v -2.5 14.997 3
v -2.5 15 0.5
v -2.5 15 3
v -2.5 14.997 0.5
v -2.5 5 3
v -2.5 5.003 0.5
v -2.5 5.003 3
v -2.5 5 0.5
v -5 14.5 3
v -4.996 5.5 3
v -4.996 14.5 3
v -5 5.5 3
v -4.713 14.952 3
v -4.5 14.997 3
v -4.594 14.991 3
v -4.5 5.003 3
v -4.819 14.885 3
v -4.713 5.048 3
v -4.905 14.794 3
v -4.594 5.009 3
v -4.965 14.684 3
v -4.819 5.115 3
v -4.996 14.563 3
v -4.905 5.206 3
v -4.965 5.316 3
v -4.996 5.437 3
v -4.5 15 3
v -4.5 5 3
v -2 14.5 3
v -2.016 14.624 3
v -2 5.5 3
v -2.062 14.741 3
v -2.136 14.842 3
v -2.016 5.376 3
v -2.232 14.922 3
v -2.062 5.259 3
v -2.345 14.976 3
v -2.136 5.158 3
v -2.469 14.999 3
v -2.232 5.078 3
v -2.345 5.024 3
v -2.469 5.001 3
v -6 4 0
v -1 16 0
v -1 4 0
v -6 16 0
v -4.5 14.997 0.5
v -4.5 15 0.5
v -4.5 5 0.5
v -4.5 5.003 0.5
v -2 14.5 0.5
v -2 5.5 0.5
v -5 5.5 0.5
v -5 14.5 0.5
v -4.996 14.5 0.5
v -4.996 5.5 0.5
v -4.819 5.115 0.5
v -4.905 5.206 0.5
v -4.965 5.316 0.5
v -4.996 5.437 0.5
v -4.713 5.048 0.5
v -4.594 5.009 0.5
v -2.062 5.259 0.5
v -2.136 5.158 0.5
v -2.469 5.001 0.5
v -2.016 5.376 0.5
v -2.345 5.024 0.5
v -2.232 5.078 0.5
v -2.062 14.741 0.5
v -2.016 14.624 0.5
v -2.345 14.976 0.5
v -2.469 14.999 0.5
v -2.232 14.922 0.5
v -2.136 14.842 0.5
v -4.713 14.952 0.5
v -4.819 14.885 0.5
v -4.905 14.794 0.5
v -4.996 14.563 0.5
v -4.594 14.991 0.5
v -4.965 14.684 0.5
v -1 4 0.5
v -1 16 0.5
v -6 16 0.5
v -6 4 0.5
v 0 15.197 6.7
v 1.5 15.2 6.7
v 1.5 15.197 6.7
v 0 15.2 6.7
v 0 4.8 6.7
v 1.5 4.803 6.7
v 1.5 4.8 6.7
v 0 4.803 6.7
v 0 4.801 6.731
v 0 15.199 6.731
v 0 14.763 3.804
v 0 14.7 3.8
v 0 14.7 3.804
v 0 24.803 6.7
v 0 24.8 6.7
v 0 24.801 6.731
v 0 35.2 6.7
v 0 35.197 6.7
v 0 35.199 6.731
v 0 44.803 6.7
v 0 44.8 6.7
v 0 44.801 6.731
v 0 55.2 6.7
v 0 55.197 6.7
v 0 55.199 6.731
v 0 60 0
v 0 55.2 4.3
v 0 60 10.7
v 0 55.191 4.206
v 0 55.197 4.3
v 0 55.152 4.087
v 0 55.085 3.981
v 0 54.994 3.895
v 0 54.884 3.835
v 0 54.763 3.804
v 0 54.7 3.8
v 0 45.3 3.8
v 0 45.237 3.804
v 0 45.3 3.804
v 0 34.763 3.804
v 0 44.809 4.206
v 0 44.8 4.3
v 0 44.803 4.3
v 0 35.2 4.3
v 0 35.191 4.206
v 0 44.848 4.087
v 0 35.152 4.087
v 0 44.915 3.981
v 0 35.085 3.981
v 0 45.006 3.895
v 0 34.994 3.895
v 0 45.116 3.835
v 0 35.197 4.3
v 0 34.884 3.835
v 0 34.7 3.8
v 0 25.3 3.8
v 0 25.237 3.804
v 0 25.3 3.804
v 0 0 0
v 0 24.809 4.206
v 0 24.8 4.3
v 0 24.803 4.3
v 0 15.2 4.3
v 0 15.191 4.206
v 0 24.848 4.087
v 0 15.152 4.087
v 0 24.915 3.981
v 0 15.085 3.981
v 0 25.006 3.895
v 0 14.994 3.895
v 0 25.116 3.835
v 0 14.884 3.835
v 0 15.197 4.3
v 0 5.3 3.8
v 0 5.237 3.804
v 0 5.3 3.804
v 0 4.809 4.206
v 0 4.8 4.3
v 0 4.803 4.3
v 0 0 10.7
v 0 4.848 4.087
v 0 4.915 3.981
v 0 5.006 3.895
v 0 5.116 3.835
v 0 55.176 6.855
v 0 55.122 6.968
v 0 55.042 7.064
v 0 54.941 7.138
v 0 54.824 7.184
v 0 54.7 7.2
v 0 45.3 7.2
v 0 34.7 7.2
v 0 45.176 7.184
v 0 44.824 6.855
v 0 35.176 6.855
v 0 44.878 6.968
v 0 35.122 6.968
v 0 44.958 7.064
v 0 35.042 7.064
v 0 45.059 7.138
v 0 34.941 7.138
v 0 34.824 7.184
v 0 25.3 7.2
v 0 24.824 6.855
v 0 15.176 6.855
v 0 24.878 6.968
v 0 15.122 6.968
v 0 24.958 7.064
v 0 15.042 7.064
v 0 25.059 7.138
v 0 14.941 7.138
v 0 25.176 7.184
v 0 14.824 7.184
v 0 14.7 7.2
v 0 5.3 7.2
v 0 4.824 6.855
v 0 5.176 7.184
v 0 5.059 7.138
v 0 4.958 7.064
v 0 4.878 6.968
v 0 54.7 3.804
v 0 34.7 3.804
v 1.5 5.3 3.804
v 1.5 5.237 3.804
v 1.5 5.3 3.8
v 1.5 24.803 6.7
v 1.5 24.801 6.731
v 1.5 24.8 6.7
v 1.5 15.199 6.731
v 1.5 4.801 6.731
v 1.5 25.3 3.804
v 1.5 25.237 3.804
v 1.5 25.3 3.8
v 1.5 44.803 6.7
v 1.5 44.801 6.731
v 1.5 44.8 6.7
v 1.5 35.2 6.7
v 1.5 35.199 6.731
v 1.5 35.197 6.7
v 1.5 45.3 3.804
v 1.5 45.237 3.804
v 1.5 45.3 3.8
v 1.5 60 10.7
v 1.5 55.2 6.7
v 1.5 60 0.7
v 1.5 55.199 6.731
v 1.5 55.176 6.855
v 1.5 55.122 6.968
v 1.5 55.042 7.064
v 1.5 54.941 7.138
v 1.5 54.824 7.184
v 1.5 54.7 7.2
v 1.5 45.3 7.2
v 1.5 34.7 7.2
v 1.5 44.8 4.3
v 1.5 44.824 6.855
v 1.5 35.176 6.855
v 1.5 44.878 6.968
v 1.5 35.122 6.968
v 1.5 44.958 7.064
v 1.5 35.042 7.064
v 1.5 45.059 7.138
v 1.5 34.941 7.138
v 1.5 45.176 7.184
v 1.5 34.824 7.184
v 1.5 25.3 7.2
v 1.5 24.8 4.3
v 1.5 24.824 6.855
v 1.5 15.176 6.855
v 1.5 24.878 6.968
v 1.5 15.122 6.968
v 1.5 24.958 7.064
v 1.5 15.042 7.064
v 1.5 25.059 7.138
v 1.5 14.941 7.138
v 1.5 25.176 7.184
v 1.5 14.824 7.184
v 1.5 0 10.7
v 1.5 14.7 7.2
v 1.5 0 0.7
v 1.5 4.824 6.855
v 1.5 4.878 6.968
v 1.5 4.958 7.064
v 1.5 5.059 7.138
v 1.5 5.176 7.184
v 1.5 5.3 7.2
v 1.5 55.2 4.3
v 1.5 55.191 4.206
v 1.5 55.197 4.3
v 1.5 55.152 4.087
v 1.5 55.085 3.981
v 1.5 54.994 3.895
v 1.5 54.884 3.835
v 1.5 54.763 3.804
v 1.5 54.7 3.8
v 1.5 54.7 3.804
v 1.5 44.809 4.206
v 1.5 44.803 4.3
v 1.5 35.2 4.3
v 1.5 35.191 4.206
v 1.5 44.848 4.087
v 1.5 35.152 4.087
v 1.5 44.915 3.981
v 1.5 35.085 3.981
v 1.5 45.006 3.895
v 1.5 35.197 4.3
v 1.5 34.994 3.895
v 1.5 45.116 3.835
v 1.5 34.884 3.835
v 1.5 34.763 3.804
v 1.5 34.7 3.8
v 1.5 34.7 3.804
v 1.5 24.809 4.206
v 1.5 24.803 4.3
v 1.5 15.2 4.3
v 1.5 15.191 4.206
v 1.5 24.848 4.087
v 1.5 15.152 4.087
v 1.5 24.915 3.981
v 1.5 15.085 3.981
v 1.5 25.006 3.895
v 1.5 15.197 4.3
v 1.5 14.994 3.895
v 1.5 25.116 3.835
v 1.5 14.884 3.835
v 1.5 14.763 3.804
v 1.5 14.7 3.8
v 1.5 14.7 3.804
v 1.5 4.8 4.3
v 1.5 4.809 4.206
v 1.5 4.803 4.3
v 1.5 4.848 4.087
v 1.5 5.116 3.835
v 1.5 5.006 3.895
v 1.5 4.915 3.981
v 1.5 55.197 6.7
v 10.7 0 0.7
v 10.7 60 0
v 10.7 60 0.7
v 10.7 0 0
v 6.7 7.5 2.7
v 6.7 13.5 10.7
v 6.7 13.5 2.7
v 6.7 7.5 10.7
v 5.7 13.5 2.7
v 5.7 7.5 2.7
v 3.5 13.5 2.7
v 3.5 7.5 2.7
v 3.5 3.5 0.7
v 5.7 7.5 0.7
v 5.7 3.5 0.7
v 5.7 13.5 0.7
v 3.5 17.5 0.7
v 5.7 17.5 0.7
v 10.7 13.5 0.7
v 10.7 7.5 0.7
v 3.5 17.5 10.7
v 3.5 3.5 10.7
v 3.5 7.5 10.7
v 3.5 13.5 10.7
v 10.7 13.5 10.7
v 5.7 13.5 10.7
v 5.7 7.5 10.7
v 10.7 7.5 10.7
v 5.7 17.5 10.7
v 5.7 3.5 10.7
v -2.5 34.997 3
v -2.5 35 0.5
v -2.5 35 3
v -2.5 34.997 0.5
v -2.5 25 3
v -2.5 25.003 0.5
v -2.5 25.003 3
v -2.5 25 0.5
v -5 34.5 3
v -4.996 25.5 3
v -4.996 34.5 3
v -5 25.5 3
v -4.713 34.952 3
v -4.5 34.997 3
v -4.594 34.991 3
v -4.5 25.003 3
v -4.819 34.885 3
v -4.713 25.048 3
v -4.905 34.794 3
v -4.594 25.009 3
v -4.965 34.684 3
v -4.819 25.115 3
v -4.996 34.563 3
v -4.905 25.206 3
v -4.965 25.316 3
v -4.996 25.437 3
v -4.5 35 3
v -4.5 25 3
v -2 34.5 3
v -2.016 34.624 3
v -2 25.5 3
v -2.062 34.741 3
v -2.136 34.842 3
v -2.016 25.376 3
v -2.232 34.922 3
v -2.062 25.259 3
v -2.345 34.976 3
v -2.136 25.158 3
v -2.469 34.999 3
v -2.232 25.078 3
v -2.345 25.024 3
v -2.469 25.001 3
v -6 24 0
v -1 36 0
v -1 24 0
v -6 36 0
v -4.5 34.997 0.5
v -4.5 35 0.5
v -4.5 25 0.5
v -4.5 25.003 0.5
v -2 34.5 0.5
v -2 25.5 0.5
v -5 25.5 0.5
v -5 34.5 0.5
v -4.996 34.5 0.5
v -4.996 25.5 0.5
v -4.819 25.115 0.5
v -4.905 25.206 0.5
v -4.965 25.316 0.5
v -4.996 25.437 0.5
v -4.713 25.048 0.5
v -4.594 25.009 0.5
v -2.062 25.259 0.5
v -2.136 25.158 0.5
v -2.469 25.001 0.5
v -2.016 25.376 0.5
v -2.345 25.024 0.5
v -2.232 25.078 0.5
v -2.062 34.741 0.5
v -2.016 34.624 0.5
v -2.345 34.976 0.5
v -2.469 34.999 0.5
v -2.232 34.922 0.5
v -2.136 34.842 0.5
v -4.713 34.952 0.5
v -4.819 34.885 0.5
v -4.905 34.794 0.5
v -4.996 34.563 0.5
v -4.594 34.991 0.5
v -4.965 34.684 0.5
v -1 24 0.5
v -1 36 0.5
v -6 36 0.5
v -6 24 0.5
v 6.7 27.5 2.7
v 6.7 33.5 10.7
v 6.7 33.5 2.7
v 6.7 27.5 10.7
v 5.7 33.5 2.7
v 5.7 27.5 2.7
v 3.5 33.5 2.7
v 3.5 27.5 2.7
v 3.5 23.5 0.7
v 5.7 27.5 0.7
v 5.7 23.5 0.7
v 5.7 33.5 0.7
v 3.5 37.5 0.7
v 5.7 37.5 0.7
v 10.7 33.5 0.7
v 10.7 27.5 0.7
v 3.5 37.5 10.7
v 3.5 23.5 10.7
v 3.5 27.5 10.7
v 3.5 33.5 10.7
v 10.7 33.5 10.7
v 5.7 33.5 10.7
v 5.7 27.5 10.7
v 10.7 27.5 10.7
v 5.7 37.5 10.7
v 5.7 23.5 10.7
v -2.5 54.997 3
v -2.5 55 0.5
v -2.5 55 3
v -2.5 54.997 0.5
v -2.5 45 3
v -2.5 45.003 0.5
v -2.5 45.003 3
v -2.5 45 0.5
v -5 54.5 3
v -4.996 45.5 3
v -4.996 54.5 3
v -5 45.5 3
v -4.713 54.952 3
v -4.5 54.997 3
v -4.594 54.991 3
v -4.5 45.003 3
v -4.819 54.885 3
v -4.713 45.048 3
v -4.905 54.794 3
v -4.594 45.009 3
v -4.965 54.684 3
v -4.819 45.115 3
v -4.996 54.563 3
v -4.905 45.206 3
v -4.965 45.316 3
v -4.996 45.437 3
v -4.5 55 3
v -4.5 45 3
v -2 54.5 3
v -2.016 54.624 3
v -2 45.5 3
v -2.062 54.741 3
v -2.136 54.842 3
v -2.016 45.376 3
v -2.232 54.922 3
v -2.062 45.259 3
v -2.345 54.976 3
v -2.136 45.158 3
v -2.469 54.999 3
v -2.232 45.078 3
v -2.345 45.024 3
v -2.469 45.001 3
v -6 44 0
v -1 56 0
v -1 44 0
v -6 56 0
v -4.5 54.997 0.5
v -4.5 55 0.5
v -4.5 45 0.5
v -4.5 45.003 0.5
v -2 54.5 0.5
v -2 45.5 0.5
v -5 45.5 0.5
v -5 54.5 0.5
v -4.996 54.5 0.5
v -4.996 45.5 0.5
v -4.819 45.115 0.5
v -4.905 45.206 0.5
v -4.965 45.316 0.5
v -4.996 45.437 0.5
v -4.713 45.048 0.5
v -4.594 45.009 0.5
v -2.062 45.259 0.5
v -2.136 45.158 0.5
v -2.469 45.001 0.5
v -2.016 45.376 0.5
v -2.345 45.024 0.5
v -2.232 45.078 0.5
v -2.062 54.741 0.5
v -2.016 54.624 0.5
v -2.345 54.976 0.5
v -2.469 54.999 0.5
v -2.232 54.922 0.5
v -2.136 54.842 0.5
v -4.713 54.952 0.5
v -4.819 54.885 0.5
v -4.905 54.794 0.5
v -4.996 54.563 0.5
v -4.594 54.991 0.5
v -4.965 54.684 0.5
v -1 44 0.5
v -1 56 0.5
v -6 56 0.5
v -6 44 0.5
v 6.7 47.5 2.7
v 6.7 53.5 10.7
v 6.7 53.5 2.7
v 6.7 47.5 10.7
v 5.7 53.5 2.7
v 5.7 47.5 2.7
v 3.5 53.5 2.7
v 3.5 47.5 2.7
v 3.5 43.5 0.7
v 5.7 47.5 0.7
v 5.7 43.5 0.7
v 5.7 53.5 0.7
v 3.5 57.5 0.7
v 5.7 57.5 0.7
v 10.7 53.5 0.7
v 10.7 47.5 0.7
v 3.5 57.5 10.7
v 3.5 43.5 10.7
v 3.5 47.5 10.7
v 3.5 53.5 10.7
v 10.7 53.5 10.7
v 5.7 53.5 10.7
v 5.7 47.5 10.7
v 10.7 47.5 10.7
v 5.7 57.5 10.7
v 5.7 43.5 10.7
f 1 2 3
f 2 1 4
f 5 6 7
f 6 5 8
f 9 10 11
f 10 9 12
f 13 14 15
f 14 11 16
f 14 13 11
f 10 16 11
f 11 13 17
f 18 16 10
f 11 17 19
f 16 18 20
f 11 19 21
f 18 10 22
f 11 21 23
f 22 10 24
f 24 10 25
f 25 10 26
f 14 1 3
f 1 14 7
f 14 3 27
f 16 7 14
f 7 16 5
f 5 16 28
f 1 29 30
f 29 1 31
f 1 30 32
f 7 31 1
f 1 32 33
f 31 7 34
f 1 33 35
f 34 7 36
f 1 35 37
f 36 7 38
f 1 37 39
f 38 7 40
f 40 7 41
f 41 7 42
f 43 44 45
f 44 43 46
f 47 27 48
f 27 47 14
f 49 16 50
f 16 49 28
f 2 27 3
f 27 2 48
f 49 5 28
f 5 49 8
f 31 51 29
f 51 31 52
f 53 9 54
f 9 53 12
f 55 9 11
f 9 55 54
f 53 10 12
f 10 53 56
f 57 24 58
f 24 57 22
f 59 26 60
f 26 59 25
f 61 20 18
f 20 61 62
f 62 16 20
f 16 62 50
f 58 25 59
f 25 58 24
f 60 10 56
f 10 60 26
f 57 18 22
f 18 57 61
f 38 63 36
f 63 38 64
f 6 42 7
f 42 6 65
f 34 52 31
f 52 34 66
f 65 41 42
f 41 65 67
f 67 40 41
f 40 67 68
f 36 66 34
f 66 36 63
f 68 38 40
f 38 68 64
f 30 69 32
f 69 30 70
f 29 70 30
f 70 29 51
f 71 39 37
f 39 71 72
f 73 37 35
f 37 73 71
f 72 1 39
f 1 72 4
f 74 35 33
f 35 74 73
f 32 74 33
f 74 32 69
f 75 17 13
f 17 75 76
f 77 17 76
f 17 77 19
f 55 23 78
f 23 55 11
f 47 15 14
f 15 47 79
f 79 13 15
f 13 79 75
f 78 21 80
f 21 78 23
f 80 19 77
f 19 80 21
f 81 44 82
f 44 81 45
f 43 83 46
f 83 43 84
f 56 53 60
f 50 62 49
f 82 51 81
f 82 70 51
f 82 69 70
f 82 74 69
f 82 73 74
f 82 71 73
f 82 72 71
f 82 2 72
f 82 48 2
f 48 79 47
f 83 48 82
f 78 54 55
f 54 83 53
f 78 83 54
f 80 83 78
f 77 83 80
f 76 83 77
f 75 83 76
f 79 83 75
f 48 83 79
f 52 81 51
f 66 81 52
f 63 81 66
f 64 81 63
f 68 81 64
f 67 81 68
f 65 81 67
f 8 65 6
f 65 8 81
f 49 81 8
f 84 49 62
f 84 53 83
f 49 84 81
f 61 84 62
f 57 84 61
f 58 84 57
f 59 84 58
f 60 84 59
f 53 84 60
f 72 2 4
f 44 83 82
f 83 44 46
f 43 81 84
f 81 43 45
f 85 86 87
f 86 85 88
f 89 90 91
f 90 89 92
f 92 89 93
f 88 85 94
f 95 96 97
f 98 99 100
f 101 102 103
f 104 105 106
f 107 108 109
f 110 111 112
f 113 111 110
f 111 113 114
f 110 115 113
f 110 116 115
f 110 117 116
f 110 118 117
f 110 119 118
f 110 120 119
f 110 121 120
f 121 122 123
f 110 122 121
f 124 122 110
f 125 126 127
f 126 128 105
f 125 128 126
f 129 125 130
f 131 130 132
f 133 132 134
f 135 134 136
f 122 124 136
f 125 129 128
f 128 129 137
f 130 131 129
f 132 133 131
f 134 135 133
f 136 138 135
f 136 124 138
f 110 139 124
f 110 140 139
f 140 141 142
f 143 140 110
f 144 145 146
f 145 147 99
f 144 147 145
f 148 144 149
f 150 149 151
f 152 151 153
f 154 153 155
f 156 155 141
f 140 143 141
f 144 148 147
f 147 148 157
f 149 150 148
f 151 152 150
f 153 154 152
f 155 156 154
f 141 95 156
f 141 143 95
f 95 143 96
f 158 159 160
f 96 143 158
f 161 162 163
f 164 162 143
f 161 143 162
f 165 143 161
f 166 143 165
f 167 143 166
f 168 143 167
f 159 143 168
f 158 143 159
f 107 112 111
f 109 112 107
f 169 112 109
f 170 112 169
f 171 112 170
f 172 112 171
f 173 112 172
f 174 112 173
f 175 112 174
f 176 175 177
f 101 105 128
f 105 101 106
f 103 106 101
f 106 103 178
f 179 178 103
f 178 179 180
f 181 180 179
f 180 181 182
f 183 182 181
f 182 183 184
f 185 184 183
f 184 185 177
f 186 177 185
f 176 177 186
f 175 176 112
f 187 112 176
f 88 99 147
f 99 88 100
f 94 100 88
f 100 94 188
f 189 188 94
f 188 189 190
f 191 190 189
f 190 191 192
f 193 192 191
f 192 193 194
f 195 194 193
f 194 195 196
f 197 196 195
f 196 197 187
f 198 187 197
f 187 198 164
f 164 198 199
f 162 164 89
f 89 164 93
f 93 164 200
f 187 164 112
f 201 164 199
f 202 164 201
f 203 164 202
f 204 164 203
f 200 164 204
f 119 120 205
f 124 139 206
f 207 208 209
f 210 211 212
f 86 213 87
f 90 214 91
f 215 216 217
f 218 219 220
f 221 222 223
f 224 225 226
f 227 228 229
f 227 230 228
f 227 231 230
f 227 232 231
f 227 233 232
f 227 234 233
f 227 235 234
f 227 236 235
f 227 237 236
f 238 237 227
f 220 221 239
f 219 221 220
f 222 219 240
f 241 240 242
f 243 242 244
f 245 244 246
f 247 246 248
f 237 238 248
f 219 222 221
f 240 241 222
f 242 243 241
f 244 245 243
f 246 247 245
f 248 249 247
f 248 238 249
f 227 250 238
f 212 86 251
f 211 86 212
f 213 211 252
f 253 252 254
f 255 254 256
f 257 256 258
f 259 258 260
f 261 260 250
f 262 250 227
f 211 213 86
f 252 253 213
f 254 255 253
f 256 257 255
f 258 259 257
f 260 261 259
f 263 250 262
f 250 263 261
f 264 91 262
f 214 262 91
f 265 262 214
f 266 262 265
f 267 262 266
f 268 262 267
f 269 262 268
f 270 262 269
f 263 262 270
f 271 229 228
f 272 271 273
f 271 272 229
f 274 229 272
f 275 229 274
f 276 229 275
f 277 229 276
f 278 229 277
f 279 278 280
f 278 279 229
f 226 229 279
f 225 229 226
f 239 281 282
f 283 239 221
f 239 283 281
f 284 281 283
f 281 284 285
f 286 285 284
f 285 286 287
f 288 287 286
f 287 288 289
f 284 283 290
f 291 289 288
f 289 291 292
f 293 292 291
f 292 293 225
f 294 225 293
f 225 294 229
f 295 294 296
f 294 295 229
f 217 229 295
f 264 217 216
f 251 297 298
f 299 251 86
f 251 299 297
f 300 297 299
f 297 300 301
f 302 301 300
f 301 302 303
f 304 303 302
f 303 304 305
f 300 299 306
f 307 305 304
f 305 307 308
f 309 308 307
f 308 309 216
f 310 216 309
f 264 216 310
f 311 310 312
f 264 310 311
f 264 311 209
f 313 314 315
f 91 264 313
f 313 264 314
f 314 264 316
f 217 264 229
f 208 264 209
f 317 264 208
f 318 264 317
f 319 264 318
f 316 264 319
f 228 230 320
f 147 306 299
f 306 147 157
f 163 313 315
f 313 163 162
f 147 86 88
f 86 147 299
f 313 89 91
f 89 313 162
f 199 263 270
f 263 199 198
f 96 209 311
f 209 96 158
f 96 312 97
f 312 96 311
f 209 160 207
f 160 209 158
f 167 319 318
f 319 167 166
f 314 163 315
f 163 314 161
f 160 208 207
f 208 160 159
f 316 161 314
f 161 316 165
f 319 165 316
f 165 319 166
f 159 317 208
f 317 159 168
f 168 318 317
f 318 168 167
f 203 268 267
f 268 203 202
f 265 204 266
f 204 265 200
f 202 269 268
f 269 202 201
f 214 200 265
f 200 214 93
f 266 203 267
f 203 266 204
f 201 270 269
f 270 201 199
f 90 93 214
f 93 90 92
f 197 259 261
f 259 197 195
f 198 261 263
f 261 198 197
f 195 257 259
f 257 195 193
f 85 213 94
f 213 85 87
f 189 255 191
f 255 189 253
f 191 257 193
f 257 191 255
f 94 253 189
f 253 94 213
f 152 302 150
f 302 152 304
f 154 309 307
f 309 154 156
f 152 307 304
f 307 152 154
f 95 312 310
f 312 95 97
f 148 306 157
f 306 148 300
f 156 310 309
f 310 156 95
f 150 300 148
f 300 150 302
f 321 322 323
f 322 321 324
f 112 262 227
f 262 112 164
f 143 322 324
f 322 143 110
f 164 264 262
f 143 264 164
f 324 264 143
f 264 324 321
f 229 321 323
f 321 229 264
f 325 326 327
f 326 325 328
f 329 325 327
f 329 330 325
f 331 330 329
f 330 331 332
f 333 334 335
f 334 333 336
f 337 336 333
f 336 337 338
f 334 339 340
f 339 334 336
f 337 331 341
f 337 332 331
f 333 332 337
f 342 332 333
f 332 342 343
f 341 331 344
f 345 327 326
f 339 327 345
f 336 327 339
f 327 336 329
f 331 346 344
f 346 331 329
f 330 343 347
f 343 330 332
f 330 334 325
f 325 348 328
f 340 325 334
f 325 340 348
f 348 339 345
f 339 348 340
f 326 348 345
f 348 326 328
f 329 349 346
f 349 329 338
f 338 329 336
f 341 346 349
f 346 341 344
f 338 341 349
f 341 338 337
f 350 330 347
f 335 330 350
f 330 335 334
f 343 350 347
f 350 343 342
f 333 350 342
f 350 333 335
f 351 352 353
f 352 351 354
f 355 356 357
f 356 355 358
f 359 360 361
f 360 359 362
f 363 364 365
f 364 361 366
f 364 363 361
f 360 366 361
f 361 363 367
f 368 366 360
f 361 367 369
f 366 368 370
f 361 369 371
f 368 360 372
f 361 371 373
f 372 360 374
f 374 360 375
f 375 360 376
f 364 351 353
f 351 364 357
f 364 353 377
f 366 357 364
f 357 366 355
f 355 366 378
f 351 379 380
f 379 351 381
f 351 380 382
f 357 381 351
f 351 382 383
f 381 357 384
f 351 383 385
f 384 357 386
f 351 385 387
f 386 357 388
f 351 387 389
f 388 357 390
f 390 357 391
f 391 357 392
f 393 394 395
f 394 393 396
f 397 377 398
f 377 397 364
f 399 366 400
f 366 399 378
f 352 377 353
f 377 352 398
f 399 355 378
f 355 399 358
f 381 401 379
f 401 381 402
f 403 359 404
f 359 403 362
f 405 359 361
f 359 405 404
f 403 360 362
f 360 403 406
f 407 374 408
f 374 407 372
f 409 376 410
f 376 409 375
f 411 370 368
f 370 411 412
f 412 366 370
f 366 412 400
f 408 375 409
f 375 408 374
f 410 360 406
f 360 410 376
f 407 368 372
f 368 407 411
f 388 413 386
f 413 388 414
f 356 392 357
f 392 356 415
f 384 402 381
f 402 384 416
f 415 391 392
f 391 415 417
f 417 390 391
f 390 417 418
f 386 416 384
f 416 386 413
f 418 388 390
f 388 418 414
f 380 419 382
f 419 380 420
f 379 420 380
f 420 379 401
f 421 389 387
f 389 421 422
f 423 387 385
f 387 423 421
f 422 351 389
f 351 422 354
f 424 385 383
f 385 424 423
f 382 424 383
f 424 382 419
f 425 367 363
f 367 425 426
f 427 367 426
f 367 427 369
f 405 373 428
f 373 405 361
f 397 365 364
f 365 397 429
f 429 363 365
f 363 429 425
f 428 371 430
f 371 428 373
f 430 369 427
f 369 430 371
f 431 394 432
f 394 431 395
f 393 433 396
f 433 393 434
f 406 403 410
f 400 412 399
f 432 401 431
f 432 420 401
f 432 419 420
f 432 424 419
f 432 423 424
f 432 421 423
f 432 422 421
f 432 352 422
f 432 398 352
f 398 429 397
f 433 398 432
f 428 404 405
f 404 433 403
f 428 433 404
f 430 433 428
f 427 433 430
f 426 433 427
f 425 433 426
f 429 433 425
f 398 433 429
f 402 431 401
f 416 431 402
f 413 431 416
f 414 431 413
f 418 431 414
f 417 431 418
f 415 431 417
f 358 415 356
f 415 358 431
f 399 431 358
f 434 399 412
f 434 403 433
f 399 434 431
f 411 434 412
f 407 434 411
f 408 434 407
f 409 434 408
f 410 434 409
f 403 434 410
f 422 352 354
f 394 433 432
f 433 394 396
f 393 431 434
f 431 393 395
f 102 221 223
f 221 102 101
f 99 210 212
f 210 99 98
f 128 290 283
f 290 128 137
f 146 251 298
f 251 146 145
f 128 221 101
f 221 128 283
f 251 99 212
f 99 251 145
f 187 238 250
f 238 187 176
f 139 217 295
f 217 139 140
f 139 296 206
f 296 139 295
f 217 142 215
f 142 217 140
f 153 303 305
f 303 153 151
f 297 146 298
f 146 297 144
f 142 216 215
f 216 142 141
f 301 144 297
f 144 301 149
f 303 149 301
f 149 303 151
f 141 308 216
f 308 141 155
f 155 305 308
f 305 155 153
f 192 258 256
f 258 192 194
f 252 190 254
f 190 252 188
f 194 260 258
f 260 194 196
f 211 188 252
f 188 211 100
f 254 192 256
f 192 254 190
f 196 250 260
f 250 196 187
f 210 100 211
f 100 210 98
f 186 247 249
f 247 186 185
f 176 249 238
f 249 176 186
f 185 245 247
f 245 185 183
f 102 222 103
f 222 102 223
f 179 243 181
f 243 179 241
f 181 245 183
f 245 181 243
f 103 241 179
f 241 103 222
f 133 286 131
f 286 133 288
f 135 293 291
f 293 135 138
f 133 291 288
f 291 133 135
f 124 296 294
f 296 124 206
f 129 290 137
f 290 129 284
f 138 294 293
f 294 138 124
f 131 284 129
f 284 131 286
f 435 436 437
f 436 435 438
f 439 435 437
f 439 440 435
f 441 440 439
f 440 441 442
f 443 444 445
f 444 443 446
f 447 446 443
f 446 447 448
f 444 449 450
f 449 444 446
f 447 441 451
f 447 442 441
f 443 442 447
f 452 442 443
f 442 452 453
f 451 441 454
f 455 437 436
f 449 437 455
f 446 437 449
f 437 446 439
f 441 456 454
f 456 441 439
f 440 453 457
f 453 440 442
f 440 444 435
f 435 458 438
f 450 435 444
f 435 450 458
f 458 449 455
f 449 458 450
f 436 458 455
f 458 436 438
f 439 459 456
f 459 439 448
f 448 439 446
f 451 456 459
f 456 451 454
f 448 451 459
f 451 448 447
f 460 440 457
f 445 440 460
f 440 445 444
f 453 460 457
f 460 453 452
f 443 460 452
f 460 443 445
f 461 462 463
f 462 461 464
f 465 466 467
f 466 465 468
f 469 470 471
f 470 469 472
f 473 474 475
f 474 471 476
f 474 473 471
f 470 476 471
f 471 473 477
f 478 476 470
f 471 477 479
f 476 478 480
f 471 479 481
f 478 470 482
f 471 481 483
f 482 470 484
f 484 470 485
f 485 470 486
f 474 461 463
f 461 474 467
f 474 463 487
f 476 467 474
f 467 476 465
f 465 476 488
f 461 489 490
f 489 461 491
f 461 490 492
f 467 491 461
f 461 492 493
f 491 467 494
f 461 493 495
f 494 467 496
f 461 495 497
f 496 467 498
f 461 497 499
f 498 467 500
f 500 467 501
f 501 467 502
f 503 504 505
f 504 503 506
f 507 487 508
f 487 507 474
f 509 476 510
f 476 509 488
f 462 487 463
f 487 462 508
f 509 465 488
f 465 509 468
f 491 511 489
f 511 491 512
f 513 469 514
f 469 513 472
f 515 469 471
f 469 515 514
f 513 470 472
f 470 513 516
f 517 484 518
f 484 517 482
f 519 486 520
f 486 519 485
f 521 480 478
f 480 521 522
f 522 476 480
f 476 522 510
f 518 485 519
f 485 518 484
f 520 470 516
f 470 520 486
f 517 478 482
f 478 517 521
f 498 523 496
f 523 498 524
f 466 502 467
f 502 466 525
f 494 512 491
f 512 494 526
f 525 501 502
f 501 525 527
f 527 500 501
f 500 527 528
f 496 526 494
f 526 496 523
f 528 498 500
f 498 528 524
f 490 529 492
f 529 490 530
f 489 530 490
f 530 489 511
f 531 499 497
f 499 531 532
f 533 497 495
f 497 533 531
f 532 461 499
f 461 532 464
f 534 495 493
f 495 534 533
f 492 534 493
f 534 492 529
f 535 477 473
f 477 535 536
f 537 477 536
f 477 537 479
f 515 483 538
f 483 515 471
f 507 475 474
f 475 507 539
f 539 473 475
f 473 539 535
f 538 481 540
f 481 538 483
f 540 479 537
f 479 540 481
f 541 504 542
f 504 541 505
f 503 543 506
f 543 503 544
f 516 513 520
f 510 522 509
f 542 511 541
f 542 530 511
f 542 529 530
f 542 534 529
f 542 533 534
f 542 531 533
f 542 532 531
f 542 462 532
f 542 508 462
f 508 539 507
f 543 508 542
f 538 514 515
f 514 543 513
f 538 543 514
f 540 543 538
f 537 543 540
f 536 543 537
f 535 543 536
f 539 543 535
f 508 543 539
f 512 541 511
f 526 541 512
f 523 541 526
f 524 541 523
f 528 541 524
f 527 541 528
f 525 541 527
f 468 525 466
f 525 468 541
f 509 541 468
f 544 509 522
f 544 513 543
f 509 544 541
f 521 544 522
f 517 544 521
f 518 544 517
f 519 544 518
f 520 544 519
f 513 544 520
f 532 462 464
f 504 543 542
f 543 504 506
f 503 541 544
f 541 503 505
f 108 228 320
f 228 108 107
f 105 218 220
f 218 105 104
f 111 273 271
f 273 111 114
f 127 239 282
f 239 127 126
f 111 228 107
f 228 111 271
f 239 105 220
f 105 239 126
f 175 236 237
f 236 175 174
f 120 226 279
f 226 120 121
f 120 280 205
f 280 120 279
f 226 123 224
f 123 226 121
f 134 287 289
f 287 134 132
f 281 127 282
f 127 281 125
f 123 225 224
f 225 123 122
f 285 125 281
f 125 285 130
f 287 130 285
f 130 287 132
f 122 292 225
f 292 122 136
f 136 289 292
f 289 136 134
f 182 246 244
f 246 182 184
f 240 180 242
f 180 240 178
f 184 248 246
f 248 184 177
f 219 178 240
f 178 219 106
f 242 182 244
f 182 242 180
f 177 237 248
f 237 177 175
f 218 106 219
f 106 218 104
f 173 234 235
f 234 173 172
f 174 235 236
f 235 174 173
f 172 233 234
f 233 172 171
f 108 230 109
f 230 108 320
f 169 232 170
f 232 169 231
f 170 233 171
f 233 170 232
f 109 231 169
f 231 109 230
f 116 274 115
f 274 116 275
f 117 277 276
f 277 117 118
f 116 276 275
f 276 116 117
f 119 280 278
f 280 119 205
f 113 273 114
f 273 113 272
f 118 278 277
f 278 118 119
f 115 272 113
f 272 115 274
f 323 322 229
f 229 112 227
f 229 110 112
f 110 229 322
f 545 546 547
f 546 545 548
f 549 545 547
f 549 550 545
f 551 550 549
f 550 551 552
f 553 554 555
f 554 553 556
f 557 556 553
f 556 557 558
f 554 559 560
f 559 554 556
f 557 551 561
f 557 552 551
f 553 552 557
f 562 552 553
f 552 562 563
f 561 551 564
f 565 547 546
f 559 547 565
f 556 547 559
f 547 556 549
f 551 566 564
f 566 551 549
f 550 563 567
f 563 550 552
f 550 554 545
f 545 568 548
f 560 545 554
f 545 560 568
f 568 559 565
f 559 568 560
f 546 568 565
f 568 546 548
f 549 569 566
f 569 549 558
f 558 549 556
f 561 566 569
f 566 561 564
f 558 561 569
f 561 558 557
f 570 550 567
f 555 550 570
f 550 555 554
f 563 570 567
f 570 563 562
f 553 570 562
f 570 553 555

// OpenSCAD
$fn=25;

wallThickness = 1.5;
topThickness = 0.7;

height = 10 + topThickness;
buttonWidth = 3.5;
buttonHeight = 3;
buttonDepth = 10;
buttonClampPadding = 1;
buttonClampWidth = .5;

buttonHoleMargin = .2;

// True Button
TButtonWidth = 3.2;
TButtonHeight = 6;
TButtonDepth = 6;
TButtonPressableWidth = 1.5;



//translate([0, 5, (height - topThickness) / 2 + topThickness - (buttonHeight + 2 *buttonHoleMargin) / 2])

buttonSet();
translate([0, 20, 0])
buttonSet();
translate([0, 40, 0])
buttonSet();

module buttonSet() {
    translate([-5, 5, buttonWidth])
    rotate([0, 90, 0])
    button();

    difference() 
    {
        cube([10.7, 20, height]);
        translate([wallThickness, -5, topThickness])
        cube([30, 40, 12]);
        
        
        
        translate([
            wallThickness, 
            -buttonHoleMargin + 5, 
            -buttonHoleMargin + (height - topThickness) / 2 + topThickness - (buttonHeight + 2 *buttonHoleMargin) / 2])
        rotate([0, -90, 0])
        boxWithRoundedCorners(
            buttonHeight + buttonHoleMargin * 2, 
            buttonDepth + buttonHoleMargin * 2, 
            wallThickness, 
            .5
        );
    }
    translate([buttonClampWidth + TButtonPressableWidth + wallThickness, 7.5, topThickness])
    buttonHolder();
}

module buttonHolder() {
    thickness = 4;
    trueWidth = TButtonWidth - 1;
    
    cube([TButtonWidth, TButtonDepth, (height - topThickness) / 2 - TButtonHeight / 2]);
    
    translate([TButtonWidth, 0, 0])
    cube([thickness, TButtonDepth, height - topThickness]);
    
    translate([0, TButtonDepth, 0])
    cube([trueWidth, thickness, height - topThickness]);
    
    translate([0, -thickness, 0])
    cube([trueWidth, thickness, height - topThickness]);
}


module button(width = buttonWidth, height = buttonHeight, depth = buttonDepth, clampPadding = buttonClampPadding, clampWidth = buttonClampWidth) {
    
    translate([width, 0, 0])
    rotate([0, -90, 0])
    boxWithRoundedCorners(height, depth, width - clampWidth, .5);
    
    
    translate([width - clampWidth, -clampPadding, -clampPadding])
    cube([
        clampWidth, 
        depth + clampPadding * 2, 
        height + clampPadding * 2
    ]);
}

module boxWithRoundedCorners(width, depth, height, cornerRadius) {
    innerWidth = width - cornerRadius * 2;
    innerDepth = depth - cornerRadius * 2;
    
    translate([cornerRadius, 0, 0])
    cube([innerWidth, depth, height]);
    translate([0, cornerRadius, 0])
    cube([width, innerDepth, height]);
    
    translate([cornerRadius, cornerRadius, 0])
    cylinder(h=height, r=cornerRadius);
    translate([width - cornerRadius, cornerRadius, 0])
    cylinder(h=height, r=cornerRadius);
    translate([width - cornerRadius, depth - cornerRadius, 0])
    cylinder(h=height, r=cornerRadius);
    translate([cornerRadius, depth - cornerRadius, 0])
    cylinder(h=height, r=cornerRadius);
}
